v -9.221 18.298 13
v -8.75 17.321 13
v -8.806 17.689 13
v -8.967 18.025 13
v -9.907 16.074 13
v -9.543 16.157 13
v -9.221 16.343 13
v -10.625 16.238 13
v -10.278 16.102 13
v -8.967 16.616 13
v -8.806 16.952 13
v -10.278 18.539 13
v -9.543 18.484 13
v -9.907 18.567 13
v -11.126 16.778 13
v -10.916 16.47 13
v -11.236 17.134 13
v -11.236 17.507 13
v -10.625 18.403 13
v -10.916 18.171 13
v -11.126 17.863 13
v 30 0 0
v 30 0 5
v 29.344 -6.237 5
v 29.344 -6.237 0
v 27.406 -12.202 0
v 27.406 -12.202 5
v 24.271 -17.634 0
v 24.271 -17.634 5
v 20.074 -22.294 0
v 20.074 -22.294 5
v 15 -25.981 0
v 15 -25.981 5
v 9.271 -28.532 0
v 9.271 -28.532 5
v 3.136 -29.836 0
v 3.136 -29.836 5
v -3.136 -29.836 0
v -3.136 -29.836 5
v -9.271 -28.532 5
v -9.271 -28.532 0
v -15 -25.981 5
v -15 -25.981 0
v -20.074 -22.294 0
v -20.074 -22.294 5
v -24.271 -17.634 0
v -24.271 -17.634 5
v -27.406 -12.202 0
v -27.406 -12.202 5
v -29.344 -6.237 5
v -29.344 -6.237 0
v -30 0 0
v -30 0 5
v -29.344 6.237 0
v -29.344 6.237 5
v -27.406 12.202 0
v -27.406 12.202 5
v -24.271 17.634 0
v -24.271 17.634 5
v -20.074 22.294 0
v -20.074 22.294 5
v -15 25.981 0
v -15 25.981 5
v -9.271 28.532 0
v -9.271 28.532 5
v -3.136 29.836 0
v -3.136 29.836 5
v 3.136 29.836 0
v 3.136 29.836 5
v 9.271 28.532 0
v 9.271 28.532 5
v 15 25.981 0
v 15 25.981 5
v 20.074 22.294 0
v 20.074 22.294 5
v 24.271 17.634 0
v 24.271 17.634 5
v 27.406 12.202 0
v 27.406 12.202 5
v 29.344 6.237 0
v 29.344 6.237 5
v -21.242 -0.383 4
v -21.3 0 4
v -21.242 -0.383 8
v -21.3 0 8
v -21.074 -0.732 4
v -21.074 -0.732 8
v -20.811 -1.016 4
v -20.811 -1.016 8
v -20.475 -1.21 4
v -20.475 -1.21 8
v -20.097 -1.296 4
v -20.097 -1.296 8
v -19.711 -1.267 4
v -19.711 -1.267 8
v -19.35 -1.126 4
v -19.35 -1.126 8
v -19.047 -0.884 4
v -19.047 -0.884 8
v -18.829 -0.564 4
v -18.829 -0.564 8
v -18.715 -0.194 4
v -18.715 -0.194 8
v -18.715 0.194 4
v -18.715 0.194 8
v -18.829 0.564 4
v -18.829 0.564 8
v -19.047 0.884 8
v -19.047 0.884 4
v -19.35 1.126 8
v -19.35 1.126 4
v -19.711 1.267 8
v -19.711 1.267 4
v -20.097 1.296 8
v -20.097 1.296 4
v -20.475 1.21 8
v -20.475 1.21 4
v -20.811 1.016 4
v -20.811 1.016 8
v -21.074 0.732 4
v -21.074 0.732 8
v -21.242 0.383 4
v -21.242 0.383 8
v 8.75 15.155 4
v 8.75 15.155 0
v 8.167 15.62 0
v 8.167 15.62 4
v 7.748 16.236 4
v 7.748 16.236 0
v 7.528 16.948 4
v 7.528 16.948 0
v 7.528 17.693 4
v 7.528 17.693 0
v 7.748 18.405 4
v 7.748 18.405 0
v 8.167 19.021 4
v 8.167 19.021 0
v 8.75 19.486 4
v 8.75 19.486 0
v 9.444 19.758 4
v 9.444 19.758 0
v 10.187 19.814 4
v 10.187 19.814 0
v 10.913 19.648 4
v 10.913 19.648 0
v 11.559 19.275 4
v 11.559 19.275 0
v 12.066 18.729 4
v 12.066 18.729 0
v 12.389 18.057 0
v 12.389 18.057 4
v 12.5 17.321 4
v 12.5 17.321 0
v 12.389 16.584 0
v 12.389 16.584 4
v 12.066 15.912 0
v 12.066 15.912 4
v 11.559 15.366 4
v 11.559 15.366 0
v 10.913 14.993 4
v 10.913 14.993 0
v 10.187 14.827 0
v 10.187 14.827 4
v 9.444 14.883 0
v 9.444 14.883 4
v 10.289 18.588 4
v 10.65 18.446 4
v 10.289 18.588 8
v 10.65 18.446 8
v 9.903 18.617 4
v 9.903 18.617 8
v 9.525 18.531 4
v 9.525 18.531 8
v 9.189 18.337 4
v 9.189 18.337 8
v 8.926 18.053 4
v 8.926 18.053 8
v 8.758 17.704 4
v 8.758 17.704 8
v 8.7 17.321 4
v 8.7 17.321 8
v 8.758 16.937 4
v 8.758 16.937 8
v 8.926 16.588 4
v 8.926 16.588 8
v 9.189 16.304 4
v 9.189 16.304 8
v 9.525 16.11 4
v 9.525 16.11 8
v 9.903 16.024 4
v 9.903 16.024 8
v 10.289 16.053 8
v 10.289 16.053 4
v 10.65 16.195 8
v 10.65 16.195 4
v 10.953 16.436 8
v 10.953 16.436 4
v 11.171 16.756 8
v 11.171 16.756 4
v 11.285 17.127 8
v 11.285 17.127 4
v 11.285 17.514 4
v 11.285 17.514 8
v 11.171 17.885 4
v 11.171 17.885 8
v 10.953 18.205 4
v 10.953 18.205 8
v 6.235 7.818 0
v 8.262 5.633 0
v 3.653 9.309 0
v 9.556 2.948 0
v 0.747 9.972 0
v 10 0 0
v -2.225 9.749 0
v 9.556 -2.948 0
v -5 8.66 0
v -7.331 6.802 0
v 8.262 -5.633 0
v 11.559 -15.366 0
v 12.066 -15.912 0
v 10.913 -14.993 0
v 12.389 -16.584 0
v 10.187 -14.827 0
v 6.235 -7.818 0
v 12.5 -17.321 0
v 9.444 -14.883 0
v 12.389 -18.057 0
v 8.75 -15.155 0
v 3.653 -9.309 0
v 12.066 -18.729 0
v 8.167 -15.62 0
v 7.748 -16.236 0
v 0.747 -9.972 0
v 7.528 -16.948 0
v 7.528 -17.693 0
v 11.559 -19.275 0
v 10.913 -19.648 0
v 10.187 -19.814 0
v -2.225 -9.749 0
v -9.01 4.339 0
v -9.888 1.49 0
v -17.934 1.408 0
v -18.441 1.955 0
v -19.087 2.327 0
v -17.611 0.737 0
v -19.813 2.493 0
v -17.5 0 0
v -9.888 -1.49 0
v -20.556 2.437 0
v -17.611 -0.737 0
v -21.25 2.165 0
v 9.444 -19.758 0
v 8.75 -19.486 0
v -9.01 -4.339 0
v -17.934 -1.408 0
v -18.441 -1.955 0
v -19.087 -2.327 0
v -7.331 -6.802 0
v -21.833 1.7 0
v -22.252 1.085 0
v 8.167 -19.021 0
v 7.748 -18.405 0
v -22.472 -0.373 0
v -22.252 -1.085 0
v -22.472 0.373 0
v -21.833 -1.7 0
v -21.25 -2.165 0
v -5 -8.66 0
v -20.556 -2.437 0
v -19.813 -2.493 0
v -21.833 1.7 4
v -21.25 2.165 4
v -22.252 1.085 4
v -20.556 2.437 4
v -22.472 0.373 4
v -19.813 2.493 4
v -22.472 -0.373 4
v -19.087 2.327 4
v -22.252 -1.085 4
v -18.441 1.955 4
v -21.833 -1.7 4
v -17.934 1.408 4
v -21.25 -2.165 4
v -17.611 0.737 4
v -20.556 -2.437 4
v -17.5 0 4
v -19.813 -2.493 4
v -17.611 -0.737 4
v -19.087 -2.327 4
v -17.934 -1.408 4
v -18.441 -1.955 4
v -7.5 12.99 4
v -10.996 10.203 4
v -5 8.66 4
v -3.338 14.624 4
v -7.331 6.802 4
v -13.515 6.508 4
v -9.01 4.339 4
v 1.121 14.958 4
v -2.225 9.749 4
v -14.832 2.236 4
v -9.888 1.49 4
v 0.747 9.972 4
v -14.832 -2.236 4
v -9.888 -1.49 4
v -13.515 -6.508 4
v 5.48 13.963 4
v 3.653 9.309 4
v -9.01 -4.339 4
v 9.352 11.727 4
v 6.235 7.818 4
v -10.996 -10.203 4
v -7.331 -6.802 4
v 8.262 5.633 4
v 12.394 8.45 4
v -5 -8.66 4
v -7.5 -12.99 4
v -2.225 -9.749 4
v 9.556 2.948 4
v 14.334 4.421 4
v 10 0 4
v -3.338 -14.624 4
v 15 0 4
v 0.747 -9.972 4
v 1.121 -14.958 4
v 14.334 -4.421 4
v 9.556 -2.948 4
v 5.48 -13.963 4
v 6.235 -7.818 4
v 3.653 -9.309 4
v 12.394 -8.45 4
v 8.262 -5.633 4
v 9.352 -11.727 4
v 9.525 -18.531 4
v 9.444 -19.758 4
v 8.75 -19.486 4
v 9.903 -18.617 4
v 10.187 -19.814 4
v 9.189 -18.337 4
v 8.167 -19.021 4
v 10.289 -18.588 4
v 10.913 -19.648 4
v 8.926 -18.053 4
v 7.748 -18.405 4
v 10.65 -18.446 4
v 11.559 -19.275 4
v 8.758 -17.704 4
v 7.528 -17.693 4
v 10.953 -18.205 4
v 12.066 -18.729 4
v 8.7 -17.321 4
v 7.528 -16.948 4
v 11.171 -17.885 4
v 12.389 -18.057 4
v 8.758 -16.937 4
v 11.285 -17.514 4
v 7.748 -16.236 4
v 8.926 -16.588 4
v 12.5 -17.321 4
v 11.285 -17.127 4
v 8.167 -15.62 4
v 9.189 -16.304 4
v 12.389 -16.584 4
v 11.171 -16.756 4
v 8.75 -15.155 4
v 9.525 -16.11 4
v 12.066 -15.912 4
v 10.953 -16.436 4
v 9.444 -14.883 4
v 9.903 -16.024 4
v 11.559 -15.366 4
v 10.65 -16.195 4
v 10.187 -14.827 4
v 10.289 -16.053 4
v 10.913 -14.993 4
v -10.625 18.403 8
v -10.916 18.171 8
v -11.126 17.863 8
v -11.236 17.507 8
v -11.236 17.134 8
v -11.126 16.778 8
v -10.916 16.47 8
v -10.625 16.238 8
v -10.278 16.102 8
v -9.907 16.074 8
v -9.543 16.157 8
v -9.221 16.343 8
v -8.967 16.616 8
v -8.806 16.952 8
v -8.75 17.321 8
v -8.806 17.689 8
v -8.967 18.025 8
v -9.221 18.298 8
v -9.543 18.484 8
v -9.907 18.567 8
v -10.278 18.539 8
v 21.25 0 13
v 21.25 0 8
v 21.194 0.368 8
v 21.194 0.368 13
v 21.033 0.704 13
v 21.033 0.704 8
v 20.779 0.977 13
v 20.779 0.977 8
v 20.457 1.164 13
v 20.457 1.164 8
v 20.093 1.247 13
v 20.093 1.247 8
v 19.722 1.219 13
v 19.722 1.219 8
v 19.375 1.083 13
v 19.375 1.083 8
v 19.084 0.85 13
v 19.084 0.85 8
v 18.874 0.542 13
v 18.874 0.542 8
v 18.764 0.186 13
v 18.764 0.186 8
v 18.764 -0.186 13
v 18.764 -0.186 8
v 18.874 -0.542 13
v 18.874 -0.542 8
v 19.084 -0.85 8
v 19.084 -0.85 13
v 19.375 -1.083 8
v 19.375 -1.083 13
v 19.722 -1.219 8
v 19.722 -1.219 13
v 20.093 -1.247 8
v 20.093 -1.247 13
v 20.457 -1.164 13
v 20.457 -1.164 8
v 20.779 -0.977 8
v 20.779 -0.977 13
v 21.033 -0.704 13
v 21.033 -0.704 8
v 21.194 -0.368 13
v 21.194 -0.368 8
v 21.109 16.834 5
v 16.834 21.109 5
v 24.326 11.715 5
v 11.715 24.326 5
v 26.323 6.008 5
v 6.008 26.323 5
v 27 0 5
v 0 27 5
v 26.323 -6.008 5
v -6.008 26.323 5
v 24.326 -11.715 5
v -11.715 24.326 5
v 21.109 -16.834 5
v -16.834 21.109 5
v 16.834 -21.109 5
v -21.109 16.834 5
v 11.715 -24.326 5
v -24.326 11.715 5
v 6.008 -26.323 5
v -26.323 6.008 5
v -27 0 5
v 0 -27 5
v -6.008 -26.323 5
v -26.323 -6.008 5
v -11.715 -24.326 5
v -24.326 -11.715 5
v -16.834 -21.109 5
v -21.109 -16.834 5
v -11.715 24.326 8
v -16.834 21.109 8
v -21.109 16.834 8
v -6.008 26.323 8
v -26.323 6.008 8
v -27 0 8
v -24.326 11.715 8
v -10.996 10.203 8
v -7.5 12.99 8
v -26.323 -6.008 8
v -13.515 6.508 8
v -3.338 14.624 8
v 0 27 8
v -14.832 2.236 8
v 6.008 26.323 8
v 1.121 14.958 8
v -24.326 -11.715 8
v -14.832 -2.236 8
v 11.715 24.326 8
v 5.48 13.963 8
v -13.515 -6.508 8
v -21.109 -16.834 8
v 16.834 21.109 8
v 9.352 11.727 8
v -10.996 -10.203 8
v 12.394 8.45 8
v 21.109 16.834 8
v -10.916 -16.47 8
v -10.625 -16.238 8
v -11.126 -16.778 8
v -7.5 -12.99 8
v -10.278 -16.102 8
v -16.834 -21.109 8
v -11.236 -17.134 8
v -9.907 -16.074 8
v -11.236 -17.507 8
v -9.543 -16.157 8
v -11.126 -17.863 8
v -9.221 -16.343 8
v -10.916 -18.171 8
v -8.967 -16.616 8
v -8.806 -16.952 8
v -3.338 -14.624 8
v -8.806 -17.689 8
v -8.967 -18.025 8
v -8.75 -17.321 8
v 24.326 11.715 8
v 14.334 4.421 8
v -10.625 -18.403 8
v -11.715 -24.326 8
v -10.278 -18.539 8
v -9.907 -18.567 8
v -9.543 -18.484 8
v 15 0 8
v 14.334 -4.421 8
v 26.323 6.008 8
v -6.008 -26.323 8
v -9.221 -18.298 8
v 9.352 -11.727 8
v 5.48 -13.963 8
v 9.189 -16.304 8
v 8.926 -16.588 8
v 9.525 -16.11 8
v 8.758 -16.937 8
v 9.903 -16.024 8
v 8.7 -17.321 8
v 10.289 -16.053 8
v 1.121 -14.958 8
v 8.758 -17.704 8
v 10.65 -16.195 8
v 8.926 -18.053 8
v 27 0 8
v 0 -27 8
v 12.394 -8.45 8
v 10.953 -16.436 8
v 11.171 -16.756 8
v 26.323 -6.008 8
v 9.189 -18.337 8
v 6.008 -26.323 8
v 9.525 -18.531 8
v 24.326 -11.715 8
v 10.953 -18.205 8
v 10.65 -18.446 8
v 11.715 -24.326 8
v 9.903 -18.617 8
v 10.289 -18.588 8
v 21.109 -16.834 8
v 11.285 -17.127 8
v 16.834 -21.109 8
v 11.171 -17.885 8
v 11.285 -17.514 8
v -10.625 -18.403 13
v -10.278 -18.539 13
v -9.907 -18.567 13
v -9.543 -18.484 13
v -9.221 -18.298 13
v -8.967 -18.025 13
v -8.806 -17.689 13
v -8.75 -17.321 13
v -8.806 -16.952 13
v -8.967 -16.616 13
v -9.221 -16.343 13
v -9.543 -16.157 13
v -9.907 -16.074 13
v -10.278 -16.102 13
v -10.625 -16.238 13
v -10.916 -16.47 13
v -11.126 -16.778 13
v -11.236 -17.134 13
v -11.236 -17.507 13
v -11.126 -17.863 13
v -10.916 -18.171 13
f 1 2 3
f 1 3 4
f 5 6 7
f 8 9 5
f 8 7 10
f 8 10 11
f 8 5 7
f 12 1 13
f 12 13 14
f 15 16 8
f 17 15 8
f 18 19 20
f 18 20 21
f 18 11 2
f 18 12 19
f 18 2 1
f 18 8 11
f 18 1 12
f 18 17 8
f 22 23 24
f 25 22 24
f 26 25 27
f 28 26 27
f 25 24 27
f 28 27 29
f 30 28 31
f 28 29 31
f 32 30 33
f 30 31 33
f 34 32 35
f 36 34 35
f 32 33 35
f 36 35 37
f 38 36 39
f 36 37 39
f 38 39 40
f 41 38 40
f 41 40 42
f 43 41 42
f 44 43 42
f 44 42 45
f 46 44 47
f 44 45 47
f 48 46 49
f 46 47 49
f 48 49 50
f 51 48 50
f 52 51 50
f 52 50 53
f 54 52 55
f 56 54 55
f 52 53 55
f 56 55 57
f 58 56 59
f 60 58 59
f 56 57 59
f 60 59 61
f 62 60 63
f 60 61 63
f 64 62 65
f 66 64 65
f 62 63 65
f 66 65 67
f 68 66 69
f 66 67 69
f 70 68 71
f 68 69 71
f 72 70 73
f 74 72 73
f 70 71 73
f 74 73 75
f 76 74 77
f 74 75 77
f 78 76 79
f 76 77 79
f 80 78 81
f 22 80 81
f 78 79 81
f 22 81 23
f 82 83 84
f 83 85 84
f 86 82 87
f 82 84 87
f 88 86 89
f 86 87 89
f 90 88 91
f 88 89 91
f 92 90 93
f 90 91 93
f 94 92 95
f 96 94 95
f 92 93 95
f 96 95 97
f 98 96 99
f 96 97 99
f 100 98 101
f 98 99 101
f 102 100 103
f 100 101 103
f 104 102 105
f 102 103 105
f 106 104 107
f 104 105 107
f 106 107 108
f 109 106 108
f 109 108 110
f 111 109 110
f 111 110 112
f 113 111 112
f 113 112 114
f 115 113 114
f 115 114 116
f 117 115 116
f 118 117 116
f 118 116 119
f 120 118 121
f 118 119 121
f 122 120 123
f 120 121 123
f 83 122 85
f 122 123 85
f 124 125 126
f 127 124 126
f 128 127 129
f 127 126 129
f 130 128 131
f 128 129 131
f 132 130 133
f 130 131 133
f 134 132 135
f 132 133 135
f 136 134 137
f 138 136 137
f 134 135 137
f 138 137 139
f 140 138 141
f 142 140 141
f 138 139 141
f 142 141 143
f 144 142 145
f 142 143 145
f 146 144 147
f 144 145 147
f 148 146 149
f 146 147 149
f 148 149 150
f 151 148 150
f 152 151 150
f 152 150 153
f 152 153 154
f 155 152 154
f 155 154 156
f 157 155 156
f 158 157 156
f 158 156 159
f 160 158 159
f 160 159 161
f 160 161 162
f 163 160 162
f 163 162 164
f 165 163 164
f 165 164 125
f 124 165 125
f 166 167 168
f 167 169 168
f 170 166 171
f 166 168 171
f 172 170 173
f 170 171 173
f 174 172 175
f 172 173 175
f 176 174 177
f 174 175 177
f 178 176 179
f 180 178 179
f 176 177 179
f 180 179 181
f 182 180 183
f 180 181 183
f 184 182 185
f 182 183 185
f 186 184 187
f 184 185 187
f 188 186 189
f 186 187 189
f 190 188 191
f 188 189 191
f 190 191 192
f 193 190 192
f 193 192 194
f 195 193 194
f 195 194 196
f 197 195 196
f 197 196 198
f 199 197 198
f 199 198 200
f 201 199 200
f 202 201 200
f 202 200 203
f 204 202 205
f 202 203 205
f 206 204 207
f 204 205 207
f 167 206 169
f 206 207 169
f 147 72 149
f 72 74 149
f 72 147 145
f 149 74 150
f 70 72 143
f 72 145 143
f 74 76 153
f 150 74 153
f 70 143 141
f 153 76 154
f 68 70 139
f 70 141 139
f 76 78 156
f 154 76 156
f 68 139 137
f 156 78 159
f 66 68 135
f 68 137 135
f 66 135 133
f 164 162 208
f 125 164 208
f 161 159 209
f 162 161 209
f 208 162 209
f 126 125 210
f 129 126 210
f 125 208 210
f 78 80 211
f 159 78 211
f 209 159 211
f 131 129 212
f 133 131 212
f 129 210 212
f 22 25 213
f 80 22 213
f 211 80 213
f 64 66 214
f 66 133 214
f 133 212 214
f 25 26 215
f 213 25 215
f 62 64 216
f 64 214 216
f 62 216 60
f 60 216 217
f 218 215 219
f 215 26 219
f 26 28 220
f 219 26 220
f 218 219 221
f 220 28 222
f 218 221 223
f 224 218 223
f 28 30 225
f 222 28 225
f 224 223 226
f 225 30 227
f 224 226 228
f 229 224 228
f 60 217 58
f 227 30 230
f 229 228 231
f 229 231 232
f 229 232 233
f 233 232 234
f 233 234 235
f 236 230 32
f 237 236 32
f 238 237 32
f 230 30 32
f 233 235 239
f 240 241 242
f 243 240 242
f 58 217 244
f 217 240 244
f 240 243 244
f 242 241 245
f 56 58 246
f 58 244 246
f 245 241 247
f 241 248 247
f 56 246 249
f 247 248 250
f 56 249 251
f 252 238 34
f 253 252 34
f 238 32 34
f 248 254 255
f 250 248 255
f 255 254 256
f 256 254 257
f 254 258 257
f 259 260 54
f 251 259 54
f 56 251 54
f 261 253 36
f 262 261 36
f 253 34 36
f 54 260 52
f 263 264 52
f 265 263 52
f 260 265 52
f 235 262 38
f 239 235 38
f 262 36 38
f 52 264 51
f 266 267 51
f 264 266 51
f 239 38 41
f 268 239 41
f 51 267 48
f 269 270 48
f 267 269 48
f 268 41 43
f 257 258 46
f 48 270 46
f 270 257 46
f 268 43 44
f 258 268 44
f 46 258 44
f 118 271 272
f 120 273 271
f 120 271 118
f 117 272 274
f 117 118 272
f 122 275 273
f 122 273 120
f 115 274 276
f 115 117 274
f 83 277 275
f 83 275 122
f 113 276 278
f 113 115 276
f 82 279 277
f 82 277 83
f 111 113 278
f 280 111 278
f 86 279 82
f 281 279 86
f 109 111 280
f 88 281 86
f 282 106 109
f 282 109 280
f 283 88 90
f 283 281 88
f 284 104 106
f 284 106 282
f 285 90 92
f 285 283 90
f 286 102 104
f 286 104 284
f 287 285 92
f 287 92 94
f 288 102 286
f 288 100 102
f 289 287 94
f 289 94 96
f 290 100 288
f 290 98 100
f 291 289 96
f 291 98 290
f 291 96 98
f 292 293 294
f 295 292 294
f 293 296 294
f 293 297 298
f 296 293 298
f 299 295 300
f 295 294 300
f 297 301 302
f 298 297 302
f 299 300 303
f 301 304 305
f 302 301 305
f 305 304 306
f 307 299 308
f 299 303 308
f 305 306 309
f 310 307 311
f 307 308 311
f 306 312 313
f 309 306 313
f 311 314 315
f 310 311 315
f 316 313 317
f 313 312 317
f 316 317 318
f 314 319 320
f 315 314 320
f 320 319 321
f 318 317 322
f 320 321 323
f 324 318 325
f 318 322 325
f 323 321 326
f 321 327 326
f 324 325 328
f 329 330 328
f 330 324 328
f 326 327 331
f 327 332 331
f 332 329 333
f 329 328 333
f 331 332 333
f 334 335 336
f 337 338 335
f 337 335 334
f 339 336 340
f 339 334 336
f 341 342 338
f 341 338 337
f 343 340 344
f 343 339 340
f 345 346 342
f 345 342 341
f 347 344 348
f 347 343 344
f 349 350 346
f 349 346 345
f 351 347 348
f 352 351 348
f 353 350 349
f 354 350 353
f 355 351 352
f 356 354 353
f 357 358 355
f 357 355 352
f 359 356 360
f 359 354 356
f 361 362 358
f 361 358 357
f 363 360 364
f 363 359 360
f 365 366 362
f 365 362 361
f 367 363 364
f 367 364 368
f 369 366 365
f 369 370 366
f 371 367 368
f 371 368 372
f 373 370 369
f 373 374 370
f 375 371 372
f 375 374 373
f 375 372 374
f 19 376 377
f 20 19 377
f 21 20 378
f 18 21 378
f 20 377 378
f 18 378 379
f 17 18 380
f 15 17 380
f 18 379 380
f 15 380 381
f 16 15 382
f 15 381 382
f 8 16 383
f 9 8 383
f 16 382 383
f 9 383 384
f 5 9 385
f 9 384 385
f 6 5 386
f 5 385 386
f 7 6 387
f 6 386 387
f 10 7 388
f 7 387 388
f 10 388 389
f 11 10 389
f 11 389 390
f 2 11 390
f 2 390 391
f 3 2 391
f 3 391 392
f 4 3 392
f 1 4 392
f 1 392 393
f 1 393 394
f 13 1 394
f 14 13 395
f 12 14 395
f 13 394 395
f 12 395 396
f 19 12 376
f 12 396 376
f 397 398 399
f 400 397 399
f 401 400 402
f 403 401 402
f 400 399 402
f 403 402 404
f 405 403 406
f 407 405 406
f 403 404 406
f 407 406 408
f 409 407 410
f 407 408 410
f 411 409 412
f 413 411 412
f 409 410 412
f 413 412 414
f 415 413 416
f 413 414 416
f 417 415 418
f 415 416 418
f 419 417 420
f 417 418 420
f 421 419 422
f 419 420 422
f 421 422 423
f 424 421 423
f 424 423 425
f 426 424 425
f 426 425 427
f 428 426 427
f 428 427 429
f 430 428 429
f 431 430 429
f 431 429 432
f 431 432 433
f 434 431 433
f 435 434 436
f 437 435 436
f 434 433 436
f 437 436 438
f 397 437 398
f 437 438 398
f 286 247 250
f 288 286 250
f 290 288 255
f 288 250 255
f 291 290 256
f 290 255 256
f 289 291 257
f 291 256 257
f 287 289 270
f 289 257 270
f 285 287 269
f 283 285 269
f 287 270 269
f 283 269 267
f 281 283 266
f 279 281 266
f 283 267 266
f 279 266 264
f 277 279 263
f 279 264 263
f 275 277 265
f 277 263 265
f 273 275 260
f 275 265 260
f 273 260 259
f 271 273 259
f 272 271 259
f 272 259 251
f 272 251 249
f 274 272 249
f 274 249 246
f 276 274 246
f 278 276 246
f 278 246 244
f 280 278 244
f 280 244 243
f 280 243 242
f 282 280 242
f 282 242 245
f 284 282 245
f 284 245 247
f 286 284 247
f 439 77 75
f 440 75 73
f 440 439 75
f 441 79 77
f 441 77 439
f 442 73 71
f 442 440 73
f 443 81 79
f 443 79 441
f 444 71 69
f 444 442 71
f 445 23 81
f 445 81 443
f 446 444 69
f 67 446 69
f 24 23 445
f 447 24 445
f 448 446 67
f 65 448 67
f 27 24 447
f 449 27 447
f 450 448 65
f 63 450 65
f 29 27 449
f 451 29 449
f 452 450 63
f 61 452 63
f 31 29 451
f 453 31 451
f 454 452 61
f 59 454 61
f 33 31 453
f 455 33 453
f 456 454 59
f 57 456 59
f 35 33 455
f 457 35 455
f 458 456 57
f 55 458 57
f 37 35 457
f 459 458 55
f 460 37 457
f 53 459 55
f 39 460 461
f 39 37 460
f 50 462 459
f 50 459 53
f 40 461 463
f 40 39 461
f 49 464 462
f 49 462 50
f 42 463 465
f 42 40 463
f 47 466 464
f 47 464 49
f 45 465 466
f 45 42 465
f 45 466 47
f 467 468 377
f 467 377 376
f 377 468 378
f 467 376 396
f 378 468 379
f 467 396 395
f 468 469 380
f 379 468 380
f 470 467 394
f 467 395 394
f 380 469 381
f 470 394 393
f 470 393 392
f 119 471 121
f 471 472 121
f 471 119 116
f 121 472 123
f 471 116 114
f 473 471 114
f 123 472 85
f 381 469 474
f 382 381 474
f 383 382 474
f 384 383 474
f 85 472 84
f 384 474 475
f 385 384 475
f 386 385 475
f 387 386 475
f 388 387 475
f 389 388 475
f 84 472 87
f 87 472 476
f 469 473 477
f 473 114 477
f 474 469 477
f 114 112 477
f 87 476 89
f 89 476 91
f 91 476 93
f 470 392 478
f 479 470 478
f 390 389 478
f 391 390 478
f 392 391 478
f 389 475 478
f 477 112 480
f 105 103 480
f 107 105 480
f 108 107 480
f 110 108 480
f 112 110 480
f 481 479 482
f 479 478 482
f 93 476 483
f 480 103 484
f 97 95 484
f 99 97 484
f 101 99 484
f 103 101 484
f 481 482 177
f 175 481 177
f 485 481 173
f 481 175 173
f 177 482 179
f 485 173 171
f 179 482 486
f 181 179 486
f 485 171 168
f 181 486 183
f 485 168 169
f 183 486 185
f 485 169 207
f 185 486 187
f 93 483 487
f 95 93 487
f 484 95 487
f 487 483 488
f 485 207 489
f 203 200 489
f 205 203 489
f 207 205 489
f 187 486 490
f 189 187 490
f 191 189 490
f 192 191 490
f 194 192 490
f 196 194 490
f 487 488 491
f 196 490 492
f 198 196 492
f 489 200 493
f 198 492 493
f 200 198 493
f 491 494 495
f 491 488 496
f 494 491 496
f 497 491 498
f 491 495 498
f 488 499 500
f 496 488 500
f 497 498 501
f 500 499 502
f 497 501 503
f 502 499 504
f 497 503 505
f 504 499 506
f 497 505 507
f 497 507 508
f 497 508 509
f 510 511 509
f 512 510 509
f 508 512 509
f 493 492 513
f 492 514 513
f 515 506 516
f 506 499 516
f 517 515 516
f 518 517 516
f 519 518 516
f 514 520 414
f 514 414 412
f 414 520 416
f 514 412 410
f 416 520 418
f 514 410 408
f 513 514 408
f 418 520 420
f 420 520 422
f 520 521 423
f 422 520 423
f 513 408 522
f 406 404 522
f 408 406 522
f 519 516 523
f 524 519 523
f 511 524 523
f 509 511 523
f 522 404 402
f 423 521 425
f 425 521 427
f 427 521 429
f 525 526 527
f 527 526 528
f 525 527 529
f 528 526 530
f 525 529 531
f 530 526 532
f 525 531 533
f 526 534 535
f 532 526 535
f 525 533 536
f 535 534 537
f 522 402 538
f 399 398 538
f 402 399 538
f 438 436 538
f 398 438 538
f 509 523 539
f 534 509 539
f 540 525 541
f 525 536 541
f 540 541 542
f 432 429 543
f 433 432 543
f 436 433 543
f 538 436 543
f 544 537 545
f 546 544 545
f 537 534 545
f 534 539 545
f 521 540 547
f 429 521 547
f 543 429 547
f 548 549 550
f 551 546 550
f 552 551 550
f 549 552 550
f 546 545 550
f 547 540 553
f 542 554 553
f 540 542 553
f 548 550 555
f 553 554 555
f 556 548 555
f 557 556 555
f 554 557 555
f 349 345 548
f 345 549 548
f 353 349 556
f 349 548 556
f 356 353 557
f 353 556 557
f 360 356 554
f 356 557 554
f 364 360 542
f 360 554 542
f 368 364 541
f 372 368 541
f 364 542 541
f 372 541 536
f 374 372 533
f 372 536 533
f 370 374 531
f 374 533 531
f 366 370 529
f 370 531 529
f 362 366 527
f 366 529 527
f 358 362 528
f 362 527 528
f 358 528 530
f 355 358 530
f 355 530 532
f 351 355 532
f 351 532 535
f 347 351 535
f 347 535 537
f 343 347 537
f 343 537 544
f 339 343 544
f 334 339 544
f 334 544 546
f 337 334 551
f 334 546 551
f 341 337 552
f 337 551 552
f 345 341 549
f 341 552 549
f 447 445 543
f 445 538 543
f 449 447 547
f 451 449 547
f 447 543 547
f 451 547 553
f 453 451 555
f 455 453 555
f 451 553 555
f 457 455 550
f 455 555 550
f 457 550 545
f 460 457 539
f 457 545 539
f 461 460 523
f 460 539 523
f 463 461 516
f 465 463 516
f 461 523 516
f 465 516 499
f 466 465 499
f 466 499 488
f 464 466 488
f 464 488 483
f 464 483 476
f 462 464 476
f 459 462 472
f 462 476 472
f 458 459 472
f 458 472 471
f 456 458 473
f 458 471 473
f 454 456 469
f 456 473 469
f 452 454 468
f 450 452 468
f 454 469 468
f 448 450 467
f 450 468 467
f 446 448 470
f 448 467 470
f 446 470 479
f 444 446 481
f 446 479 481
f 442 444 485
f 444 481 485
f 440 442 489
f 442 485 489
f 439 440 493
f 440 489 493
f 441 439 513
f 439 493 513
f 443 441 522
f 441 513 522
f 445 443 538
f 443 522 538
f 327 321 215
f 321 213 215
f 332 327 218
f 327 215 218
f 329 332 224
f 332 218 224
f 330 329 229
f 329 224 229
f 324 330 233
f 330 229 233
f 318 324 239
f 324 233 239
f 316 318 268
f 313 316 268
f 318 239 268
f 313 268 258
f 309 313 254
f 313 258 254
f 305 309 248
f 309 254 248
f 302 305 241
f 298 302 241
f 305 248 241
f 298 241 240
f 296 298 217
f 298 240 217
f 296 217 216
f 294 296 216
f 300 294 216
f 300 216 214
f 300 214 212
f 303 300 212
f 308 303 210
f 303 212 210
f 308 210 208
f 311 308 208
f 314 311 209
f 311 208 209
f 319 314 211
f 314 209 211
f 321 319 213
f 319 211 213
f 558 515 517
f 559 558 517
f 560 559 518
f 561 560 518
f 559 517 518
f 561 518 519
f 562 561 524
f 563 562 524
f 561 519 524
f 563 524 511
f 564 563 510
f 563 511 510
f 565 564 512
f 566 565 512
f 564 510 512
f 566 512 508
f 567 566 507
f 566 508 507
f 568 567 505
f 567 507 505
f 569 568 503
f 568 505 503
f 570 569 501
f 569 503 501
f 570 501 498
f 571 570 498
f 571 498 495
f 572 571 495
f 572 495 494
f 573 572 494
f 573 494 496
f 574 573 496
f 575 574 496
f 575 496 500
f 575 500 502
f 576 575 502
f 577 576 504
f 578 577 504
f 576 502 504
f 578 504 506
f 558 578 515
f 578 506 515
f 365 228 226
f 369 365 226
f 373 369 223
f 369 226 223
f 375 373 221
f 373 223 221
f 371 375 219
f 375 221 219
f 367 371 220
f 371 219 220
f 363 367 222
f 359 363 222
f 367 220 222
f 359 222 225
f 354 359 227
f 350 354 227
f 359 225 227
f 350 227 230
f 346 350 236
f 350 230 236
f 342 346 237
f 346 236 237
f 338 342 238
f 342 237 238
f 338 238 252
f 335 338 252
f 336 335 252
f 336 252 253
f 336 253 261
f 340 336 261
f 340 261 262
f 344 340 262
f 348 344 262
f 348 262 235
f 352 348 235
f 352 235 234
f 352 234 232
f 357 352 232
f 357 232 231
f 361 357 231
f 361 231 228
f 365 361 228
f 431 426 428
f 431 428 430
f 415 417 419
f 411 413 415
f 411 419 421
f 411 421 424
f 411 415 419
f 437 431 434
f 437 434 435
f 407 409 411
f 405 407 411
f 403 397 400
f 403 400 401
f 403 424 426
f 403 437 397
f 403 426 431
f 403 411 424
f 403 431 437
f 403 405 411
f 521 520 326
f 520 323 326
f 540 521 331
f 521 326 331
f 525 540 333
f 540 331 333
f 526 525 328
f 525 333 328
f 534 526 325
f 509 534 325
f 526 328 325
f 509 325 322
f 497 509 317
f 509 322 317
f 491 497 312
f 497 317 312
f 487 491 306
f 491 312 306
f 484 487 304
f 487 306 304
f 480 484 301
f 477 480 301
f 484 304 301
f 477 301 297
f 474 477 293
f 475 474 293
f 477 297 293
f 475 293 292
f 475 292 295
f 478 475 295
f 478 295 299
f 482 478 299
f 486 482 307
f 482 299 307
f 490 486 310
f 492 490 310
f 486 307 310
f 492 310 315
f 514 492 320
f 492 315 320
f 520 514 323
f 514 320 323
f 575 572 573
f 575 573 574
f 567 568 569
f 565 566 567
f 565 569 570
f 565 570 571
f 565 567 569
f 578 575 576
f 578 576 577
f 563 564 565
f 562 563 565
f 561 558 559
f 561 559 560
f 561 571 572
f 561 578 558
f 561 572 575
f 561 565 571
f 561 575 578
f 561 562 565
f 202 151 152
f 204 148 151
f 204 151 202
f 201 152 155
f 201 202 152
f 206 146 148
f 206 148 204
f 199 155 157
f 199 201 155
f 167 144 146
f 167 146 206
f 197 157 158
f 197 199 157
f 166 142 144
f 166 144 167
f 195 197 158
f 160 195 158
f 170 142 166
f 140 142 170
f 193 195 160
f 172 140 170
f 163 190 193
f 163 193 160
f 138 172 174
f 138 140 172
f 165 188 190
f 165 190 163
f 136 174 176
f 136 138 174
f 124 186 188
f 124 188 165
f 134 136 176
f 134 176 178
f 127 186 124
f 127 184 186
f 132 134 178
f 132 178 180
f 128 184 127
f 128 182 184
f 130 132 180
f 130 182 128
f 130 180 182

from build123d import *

# Parameters (mm, degrees)
F2_R            = 1.25
F3_DEPTH        = 5
F3_COPIES_COUNT = 3
F5_D            = 2.6
F5_CBORE_D      = 5
F5_CBORE_DEPTH  = 4
F5_COPIES_COUNT = 3
F6_W            = 3
F6_H            = 3


# Not quite as in the source:
# - a pattern or mirror of a feature is missing from the dataset's text; its kind, count and spacing are read off the source's solid


with BuildPart() as f1:
    # F0 (on Front) → F1 (revolve)
    with BuildSketch(Plane.XZ):
        Polygon((10, 4), (10, 0), (30, 0), (30, 8), (15, 8), (15, 4), align=None)
    revolve(axis=Axis((0, 0, 1.9594207406), (0, 0, -1)))

    # F2 (on face) → F3 (join)
    with BuildSketch(Plane.XY.offset(8)):
        with Locations((20, 0)):
            Circle(F2_R)
    f3 = extrude(amount=F3_DEPTH)

    # F3_copies: F3 ×3 about axis
    f3_copies_axis = Axis((0, 0, 0), (0, 0, 1))
    for i in range(1, F3_COPIES_COUNT):
        add(f3.rotate(f3_copies_axis, i * 360 / F3_COPIES_COUNT))

    # F5 (through all)
    with Locations(Plane(origin=(0, 0, 0), x_dir=(1, 0, 0), z_dir=(0, 0, -1))):
        with Locations((-20, 0)):
            f5 = CounterBoreHole(F5_D / 2, F5_CBORE_D / 2, F5_CBORE_DEPTH)

    # F5_copies: F5 ×3 about axis
    f5_copies_axis = Axis((0, 0, 0), (0, 0, 1))
    for i in range(1, F5_COPIES_COUNT):
        add(f5.rotate(f5_copies_axis, i * 360 / F5_COPIES_COUNT), mode=Mode.SUBTRACT)

    # F6 (on Front) → F7 (revolve, cut)
    with BuildSketch(Plane.XZ):
        with Locations((28.5, 6.5)):
            Rectangle(F6_W, F6_H)
    revolve(axis=Axis((0, 0, 1.9594207406), (0, 0, -1)), mode=Mode.SUBTRACT)


solid = f1.part
